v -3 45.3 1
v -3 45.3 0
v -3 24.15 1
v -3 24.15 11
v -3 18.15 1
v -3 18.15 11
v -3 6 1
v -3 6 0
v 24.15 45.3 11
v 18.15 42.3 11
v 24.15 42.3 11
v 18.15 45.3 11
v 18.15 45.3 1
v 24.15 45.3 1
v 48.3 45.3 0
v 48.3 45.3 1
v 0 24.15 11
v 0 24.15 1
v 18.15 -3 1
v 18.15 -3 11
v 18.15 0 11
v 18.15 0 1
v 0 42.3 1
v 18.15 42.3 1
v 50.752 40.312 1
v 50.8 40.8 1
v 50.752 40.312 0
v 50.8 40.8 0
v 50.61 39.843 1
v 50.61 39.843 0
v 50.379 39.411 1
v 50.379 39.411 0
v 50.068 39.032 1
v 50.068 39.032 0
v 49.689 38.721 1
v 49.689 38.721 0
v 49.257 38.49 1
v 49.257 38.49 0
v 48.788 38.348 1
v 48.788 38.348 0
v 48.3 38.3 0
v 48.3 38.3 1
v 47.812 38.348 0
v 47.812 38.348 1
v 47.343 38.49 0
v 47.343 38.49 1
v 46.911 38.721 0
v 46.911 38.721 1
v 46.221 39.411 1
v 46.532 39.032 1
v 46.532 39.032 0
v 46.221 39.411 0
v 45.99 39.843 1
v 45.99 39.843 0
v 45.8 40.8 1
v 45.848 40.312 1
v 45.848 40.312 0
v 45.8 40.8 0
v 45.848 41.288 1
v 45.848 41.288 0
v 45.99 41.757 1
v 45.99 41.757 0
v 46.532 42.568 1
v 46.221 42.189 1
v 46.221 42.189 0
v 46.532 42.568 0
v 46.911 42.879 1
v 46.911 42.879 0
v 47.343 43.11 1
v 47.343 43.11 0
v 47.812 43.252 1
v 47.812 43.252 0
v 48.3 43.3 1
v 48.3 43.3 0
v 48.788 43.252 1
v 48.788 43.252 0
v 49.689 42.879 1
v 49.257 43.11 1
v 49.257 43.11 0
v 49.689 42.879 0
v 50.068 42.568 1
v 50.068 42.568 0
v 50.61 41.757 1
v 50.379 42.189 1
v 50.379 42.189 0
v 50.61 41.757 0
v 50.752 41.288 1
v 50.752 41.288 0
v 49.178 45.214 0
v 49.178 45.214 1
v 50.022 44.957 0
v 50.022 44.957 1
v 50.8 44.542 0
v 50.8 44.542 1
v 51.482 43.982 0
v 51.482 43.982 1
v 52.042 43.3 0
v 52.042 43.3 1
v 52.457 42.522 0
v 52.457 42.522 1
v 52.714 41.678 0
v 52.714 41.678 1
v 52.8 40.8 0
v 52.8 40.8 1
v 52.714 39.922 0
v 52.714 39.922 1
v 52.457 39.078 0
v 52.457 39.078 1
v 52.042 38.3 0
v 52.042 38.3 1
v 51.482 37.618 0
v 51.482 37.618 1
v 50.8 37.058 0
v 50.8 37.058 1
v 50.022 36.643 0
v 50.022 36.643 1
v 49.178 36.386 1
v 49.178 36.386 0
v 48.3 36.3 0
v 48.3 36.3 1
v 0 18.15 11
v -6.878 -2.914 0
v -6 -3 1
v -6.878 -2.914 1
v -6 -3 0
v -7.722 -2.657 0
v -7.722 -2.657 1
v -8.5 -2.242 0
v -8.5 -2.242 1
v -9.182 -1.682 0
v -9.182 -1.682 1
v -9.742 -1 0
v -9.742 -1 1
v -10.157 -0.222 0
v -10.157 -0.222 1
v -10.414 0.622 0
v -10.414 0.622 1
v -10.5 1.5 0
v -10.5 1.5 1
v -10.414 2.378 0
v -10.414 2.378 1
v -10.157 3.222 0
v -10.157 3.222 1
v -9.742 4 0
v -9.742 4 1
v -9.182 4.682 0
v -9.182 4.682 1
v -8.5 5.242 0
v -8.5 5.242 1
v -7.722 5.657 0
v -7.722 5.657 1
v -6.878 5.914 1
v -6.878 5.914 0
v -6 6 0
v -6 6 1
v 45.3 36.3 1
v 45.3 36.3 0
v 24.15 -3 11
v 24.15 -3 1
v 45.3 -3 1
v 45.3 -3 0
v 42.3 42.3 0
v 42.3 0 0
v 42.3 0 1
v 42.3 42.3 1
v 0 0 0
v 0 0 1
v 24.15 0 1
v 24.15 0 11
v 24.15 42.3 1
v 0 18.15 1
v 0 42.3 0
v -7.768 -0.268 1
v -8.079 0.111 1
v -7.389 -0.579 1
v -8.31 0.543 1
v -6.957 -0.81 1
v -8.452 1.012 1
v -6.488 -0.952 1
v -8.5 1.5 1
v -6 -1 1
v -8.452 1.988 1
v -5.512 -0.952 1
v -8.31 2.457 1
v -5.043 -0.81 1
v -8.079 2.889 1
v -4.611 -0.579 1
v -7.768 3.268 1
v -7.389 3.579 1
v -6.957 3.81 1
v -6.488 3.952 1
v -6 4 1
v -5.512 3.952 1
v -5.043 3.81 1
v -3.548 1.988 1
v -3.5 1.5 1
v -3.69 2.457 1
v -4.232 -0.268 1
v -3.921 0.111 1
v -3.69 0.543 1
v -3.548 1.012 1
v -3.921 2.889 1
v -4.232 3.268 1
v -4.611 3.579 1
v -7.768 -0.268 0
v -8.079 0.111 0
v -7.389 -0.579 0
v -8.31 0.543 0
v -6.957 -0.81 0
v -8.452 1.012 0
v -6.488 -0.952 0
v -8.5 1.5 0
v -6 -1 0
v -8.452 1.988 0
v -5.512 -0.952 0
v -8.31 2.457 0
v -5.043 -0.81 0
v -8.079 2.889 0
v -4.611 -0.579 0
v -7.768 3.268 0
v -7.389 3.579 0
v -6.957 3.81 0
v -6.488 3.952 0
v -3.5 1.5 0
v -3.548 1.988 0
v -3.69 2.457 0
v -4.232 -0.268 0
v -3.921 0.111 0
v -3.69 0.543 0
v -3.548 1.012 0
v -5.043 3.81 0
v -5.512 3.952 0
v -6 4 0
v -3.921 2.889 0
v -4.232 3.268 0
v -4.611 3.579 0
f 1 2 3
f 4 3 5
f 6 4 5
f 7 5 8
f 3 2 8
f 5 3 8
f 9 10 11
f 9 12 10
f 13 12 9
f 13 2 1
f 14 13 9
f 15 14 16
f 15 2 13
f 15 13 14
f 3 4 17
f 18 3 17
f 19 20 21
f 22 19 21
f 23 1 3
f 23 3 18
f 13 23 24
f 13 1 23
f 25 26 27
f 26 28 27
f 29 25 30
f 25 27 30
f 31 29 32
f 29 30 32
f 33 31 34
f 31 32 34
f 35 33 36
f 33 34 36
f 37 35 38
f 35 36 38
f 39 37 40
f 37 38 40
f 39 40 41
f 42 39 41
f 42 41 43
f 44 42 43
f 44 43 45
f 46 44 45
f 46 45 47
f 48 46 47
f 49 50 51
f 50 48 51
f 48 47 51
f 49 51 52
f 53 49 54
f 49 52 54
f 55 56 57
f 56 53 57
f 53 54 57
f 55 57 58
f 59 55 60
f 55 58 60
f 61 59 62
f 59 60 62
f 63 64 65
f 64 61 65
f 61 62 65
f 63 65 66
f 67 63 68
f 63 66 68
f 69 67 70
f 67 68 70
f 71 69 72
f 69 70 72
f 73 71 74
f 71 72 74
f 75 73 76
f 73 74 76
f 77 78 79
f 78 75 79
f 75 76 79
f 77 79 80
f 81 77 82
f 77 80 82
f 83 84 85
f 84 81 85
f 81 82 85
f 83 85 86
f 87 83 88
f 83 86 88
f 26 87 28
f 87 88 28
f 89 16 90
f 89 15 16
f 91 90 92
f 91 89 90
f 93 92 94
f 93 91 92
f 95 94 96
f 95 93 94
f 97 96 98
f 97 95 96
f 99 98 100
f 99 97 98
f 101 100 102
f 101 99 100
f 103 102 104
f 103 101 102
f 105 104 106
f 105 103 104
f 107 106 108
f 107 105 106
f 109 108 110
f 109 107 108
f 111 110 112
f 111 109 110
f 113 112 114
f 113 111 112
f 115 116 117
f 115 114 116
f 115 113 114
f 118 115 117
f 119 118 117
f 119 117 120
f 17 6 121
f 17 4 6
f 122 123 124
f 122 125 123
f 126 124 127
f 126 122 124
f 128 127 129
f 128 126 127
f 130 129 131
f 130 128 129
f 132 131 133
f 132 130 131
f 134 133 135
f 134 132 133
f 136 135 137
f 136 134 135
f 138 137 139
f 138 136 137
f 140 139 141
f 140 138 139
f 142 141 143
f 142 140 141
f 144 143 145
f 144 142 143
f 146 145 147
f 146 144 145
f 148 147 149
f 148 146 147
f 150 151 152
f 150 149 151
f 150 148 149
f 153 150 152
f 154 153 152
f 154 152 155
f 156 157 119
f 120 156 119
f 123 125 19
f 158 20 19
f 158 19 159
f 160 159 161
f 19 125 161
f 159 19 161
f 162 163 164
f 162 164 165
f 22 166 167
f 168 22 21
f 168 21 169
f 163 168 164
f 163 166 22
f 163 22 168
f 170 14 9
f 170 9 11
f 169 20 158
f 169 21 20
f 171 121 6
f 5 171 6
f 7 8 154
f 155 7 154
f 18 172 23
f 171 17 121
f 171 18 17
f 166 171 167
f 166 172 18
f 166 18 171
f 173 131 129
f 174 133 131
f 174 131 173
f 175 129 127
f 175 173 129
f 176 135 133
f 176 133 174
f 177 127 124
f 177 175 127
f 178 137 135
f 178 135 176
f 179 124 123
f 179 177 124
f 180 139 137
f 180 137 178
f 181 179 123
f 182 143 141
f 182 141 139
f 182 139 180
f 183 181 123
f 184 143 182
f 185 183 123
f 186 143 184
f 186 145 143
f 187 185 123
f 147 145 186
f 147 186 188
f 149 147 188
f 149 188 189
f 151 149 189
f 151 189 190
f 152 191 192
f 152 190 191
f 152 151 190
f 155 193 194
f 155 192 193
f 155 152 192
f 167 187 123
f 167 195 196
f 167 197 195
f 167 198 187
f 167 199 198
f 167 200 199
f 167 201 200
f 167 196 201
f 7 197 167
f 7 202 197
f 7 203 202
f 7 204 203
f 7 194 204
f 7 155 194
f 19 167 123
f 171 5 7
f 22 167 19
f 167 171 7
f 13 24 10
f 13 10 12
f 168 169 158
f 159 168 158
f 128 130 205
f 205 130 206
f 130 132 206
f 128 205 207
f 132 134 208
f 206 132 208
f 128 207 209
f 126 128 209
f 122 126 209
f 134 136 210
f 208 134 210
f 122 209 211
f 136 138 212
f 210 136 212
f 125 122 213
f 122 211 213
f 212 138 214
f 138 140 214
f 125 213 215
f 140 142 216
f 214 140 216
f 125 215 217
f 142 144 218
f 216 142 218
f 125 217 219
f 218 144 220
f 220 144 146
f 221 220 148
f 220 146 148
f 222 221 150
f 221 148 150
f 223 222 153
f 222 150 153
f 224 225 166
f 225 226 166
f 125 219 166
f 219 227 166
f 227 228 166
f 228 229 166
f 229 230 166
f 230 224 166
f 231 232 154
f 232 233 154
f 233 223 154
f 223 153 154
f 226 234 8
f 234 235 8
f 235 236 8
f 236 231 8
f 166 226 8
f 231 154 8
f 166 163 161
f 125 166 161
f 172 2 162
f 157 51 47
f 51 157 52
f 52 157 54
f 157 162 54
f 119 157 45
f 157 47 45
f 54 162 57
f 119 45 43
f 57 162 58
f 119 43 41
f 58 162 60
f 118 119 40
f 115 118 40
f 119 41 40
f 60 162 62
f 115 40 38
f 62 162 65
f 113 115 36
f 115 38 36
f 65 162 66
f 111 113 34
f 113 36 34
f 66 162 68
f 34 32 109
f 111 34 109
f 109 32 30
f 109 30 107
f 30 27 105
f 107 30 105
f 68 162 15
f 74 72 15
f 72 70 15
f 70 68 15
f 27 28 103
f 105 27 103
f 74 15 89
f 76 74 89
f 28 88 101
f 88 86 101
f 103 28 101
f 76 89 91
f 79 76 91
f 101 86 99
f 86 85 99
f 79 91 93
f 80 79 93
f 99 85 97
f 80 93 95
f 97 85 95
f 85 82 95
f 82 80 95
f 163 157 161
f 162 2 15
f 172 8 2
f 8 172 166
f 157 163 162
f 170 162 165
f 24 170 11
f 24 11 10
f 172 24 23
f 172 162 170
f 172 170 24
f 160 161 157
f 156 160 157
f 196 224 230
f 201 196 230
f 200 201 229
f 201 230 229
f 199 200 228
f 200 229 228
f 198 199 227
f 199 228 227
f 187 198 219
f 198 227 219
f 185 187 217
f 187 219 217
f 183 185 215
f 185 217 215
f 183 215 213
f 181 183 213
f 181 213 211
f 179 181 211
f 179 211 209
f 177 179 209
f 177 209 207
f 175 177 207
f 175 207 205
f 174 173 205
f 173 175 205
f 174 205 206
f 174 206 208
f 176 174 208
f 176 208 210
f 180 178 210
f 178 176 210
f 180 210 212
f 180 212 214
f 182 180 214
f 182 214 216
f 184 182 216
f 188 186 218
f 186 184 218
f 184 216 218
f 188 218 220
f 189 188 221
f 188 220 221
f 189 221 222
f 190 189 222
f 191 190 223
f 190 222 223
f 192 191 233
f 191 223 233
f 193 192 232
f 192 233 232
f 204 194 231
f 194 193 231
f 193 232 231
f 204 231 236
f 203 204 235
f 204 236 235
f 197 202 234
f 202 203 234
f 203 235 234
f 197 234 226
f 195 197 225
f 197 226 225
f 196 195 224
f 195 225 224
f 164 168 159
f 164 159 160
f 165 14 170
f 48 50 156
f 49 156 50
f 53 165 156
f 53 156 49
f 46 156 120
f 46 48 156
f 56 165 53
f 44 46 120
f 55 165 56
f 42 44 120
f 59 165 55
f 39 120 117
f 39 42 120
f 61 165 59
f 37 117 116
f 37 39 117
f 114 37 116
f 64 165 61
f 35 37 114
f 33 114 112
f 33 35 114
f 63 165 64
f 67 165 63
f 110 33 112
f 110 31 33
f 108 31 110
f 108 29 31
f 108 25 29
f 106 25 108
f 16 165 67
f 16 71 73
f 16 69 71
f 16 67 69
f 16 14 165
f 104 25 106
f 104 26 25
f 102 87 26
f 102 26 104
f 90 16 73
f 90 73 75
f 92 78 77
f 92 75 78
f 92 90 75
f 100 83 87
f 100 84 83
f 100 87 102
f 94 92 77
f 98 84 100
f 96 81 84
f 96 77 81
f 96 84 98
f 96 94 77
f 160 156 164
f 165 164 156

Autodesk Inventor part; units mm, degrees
ref_plane "YZ Plane" through (0, 0, 0) normal (1, 0, 0) x (0, 1, 0)
ref_plane "XZ Plane" through (0, 0, 0) normal (0, 1, 0) x (-1, 0, 0)
ref_plane "XY Plane" through (0, 0, 0) normal (0, 0, 1) x (1, 0, 0)
sketch "Sketch1" plane through (0, 0, 0) normal (0, 0, 1) x (1, 0, 0)
  line L0 (0, 0) -> (42.3, 0)
  line L1 (42.3, 0) -> (42.3, 42.3)
  line L2 (42.3, 42.3) -> (0, 42.3)
  line L3 (0, 42.3) -> (0, 0)
  line L4 (45.3, -3) -> (45.3, 45.3)
  line L5 (-3, 45.3) -> (-3, -3)
  line L6 (-6, -3) -> (45.3, -3)
  line L7 (-3, 45.3) -> (48.3, 45.3)
  circle A0 centre (48.3, 40.8) radius 2.5
  arc A1 (48.3, 36.3) -> (48.3, 45.3) centre (48.3, 40.8) ccw
  line L8 (45.3, 36.3) -> (48.3, 36.3)
  circle A2 centre (-6, 1.5) radius 2.5
  arc A3 (-6, 6) -> (-6, -3) centre (-6, 1.5) ccw
  line L9 (-3, 6) -> (-6, 6)
  point P0 (45.3, 42.3)
  point P1 (45.3, 0)
  point P2 (-3, 0)
  point P3 (-3, 42.3)
  dimension "d0" = 42.3
  dimension "d1" = 42.3
  dimension "d3" = 3
  dimension "d5" = 3
  dimension "d29" = 3
  dimension "d43" = 3
  dimension "d50" = 5
  dimension "d51" = 9
  dimension "d52" = 3
  dimension "d61" = 5
  dimension "d62" = 9
  dimension "d63" = 3
extrude "Extrusion7" add sketch "Sketch1" along normal blind 1
sketch "Sketch3" plane through (0, 0, 1) normal (0, 0, 1) x (1, 0, 0)
  line L0 (0, 0) -> (0, 42.3) projected
  line L1 (0, 42.3) -> (42.3, 42.3) projected
  line L2 (42.3, 42.3) -> (42.3, 0) projected
  line L3 (42.3, 0) -> (0, 0) projected
  circle A0 centre (48.3, 40.8) radius 2.5 projected
  circle A1 centre (-6, 1.5) radius 2.5 projected
  line L4 (-3, 6) -> (-6, 6) projected
  arc A2 (-6, 6) -> (-6, -3) centre (-6, 1.5) ccw projected
  line L5 (-6, -3) -> (45.3, -3) projected
  line L6 (45.3, -3) -> (45.3, 36.3) projected
  line L7 (45.3, 36.3) -> (48.3, 36.3) projected
  arc A3 (48.3, 36.3) -> (48.3, 45.3) centre (48.3, 40.8) ccw projected
  line L8 (48.3, 45.3) -> (-3, 45.3) projected
  line L9 (-3, 45.3) -> (-3, 6) projected
  line L10 (0, 42.3) -> (0, 0) projected
  line L11 (-3, 24.15) -> (0, 24.15)
  line L12 (0, 24.15) -> (0, 18.15)
  line L13 (0, 18.15) -> (-3, 18.15)
  line L14 (-3, 18.15) -> (-3, 24.15)
  line L15 (42.3, 24.15) -> (45.3, 24.15)
  line L16 (45.3, 24.15) -> (45.3, 18.15)
  line L17 (45.3, 18.15) -> (42.3, 18.15)
  line L18 (42.3, 18.15) -> (42.3, 24.15)
  line L19 (18.15, 45.3) -> (24.15, 45.3)
  line L20 (24.15, 45.3) -> (24.15, 42.3)
  line L21 (24.15, 42.3) -> (18.15, 42.3)
  line L22 (18.15, 42.3) -> (18.15, 45.3)
  line L23 (42.3, 0) -> (0, 0) projected
  line L24 (18.15, 0) -> (24.15, 0)
  line L25 (24.15, 0) -> (24.15, -3)
  line L26 (24.15, -3) -> (18.15, -3)
  line L27 (18.15, -3) -> (18.15, 0)
  dimension "d66" = 6
  dimension "d67" = 6
  dimension "d68" = 6
  dimension "d69" = 6
  dimension "d70" = 18.15
  dimension "d71" = 18.15
  dimension "d72" = 18.15
extrude "Extrusion9" add sketch "Sketch3" along normal blind 10 contours L13 L9 L11 L0 | L3 L25 L5 L27 | L22 L8 L20 L1
properties part number "Stepper_Motor_Holder-SquareBar-Rev3"
